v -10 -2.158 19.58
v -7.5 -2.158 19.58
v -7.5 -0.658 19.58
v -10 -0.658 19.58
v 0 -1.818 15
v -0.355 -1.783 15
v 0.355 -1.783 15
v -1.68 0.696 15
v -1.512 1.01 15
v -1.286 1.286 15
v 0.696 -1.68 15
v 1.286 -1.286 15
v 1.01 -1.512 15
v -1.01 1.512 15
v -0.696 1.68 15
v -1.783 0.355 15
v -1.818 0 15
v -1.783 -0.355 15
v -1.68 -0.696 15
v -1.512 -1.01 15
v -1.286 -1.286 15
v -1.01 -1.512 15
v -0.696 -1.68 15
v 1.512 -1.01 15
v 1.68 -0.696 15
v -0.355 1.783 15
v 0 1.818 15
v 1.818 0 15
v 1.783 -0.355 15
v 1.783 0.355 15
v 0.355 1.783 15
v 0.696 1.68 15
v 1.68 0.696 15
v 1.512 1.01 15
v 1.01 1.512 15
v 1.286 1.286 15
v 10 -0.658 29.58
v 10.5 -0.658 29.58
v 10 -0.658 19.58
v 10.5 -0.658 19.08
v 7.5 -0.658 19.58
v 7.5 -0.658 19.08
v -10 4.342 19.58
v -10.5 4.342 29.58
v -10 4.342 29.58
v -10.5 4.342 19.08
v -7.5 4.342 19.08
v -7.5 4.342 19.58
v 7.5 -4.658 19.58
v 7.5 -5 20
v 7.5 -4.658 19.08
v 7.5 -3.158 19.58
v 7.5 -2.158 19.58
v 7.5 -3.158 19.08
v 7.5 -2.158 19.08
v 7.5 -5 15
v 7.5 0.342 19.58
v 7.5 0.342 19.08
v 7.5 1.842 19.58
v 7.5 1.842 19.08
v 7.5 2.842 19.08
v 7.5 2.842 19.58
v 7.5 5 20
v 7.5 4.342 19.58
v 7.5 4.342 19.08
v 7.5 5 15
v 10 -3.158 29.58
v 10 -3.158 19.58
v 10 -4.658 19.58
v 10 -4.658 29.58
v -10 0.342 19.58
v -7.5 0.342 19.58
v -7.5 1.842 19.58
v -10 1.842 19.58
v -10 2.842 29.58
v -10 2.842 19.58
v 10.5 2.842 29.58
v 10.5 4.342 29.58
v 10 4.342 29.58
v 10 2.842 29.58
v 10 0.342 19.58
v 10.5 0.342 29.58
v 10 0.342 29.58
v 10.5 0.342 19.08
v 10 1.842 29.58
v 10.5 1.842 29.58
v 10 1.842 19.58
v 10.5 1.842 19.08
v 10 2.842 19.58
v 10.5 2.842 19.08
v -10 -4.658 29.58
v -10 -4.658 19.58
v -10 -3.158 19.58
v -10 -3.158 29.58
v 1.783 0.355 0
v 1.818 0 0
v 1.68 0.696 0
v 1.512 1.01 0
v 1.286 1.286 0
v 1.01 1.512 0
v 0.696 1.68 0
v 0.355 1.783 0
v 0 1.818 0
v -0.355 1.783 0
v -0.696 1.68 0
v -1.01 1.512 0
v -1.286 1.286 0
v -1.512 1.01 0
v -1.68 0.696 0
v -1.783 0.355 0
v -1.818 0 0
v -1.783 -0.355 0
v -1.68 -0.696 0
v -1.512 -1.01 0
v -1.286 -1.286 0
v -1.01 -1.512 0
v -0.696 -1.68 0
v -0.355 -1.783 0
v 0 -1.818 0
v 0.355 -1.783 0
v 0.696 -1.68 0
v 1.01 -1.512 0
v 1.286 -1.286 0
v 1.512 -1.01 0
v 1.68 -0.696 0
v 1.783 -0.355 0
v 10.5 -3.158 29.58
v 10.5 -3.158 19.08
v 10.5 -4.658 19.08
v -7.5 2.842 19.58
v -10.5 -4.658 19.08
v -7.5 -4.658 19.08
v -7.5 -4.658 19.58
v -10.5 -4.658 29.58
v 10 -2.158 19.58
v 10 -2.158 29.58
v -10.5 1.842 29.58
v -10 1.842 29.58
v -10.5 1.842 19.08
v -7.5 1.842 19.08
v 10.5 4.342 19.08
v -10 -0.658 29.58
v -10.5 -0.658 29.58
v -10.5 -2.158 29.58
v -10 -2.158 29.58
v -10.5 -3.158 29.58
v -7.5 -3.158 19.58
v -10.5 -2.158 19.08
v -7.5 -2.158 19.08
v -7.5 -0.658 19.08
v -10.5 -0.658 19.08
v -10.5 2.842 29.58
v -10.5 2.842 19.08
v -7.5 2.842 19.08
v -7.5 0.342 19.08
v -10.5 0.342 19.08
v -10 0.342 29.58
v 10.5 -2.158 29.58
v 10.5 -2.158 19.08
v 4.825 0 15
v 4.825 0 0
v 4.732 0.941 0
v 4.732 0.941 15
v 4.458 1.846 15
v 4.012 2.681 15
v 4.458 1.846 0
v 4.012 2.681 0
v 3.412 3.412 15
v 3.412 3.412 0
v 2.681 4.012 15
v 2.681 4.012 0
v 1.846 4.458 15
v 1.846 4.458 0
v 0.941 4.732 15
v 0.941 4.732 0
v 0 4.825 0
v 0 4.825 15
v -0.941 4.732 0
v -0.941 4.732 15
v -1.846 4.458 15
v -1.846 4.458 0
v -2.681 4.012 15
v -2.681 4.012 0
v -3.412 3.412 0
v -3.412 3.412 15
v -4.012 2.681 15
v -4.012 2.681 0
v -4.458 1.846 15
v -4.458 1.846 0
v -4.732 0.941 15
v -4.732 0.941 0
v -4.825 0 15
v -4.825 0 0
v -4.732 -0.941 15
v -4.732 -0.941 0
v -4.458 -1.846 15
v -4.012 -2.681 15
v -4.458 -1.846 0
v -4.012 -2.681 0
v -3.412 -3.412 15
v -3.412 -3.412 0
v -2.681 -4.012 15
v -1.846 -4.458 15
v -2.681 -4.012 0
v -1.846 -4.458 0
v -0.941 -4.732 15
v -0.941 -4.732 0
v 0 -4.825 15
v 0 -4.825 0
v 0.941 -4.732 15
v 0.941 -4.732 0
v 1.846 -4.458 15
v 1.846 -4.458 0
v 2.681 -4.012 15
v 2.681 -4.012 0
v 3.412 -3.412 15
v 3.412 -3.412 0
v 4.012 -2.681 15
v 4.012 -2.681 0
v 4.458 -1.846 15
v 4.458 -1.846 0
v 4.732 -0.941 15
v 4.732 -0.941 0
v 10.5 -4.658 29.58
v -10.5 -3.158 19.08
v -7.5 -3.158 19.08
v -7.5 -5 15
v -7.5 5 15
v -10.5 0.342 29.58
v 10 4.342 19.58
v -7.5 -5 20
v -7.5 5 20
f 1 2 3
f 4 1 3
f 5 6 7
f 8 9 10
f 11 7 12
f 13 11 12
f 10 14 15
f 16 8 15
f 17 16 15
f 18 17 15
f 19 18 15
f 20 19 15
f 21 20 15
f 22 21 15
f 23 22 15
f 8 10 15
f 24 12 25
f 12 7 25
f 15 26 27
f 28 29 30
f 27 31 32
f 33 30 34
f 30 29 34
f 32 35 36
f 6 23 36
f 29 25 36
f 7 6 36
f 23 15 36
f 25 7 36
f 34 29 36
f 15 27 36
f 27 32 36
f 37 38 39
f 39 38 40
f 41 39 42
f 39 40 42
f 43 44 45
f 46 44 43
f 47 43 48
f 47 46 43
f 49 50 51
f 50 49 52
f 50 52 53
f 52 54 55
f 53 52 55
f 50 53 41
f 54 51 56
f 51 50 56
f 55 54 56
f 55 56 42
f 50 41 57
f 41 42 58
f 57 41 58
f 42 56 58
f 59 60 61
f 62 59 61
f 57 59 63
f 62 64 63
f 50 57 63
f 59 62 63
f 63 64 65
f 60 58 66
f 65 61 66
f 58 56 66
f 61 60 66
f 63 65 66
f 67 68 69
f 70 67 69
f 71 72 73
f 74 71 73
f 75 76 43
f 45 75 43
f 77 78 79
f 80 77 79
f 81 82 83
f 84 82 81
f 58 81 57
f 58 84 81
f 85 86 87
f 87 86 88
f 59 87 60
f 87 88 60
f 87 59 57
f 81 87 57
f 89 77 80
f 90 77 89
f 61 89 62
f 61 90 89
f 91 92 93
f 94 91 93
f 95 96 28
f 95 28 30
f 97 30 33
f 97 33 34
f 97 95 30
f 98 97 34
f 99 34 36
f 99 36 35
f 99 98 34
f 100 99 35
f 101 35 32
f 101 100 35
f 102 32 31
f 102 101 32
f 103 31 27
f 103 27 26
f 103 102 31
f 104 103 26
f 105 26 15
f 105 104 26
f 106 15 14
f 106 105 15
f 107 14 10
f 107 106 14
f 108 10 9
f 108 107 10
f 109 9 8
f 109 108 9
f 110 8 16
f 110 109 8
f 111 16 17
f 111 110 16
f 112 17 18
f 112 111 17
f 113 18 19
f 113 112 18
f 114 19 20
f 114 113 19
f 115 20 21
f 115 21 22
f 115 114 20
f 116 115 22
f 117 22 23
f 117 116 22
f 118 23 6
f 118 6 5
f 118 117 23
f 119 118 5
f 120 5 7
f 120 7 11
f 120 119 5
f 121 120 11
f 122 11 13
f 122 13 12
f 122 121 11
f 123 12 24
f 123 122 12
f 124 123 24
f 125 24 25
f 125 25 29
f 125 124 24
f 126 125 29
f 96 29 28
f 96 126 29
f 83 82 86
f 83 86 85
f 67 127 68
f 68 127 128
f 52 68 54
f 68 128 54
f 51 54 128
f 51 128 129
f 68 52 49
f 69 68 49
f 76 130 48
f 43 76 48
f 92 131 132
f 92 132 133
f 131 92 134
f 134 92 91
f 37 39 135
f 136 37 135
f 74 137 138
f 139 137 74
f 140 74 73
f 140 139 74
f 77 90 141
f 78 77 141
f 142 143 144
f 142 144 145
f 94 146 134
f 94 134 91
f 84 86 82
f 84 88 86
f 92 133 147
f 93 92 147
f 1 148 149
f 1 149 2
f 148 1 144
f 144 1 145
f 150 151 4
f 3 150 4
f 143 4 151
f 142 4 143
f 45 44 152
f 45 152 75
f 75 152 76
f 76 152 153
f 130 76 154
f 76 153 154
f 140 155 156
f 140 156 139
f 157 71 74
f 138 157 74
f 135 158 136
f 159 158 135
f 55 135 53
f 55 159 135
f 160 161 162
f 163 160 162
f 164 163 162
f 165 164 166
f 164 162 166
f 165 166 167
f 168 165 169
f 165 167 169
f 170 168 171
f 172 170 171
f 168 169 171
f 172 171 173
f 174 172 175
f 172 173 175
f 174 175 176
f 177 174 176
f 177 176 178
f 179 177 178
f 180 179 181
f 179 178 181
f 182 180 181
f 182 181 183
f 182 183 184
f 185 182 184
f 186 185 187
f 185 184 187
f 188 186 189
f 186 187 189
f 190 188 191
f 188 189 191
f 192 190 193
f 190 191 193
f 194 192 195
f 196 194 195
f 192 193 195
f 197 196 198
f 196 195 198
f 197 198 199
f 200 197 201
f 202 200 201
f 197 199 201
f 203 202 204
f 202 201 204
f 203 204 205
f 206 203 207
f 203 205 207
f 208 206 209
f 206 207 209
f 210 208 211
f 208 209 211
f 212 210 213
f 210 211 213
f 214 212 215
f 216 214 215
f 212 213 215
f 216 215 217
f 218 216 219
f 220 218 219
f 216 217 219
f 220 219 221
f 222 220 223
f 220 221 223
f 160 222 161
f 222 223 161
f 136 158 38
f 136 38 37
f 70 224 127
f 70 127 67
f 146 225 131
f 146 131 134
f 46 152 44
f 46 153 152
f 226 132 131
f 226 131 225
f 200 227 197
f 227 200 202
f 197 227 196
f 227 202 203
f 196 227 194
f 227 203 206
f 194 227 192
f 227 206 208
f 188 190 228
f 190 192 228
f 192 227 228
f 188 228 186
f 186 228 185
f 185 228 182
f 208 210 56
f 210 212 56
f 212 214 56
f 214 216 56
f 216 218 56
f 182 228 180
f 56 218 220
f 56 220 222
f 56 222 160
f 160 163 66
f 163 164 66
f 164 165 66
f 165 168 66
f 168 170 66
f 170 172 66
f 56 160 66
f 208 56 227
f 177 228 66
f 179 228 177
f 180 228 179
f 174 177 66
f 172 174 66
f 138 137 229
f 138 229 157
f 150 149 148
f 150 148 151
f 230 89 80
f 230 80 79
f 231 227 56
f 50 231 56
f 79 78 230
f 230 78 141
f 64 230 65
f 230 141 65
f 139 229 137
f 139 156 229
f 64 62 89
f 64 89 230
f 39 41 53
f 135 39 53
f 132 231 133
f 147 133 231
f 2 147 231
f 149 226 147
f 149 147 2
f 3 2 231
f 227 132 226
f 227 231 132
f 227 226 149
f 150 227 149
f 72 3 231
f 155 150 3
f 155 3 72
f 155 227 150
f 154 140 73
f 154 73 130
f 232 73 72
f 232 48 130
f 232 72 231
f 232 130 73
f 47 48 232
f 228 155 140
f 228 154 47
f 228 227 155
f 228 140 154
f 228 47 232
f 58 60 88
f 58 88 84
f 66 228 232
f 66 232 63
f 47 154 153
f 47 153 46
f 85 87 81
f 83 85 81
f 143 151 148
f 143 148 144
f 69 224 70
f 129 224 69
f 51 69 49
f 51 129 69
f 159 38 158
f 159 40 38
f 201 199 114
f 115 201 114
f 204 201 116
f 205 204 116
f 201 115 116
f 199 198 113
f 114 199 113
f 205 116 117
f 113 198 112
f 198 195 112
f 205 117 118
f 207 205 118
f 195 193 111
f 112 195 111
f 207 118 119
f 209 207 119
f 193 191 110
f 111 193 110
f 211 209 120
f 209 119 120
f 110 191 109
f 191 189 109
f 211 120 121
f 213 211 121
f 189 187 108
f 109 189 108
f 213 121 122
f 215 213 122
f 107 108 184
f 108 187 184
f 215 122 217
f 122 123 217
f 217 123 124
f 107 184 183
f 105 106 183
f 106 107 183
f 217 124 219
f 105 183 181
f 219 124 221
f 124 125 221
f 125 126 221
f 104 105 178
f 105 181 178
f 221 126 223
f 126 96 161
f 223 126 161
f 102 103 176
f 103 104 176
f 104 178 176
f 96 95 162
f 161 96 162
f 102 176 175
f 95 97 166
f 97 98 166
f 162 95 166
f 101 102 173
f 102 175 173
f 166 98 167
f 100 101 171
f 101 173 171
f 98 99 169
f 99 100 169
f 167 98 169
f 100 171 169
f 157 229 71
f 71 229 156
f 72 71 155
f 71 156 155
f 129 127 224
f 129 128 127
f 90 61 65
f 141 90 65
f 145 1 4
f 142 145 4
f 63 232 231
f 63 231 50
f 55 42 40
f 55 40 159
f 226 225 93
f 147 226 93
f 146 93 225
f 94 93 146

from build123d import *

# Parameters (mm, degrees)
SKETCH1_R               = 4.825
SKETCH1_R_2             = 1.818202682
BOSS_EXTRUDE1_DEPTH     = 15
SKETCH2_W               = 15
SKETCH2_H               = 10
BOSS_EXTRUDE2_DEPTH     = 5
SKETCH3_W               = 0.5
SKETCH3_H               = 1.5
BOSS_EXTRUDE3_DEPTH     = 3
SKETCH4_W               = 0.5
SKETCH4_H               = 1.5
BOSS_EXTRUDE4_DEPTH     = 10
LPATTERN2_COUNT         = 4
LPATTERN2_PITCH         = 2.5
MIRROR1_COPY_1_SKETCH_W = 0.5
MIRROR1_COPY_1_SKETCH_H = 1.5
MIRROR1_COPY_1_DEPTH    = 3
MIRROR1_COPY_2_SKETCH_W = 0.5
MIRROR1_COPY_2_SKETCH_H = 1.5
MIRROR1_COPY_2_DEPTH    = 3
MIRROR1_COPY_3_SKETCH_W = 0.5
MIRROR1_COPY_3_SKETCH_H = 1.5
MIRROR1_COPY_3_DEPTH    = 3
MIRROR1_COPY_4_SKETCH_W = 0.5
MIRROR1_COPY_4_SKETCH_H = 1.5
MIRROR1_COPY_4_DEPTH    = 10
MIRROR1_COPY_5_SKETCH_W = 0.5
MIRROR1_COPY_5_SKETCH_H = 1.5
MIRROR1_COPY_5_DEPTH    = 10
MIRROR1_COPY_6_SKETCH_W = 0.5
MIRROR1_COPY_6_SKETCH_H = 1.5
MIRROR1_COPY_6_DEPTH    = 10


with BuildPart() as part:
    # Sketch1 → Boss-Extrude1 (new body)
    with BuildSketch(Plane.XY):
        Circle(SKETCH1_R)
        Circle(SKETCH1_R_2, mode=Mode.SUBTRACT)
    extrude(amount=BOSS_EXTRUDE1_DEPTH)

    # Sketch2 → Boss-Extrude2 (add)
    with BuildSketch(Plane.XY.offset(15)):
        Rectangle(SKETCH2_W, SKETCH2_H)
    extrude(amount=BOSS_EXTRUDE2_DEPTH)

    # Sketch3 → Boss-Extrude3 (add)
    with BuildSketch(Plane.ZY.offset(7.5)):
        with Locations((19.330067801, 3.591756208)):
            Rectangle(SKETCH3_W, SKETCH3_H)
    boss_extrude3 = extrude(amount=BOSS_EXTRUDE3_DEPTH)

    # Sketch4 → Boss-Extrude4 (add)
    with BuildSketch(Plane.XY.offset(19.580067801)):
        with Locations((-10.25, 3.591756208)):
            Rectangle(SKETCH4_W, SKETCH4_H)
    boss_extrude4 = extrude(amount=BOSS_EXTRUDE4_DEPTH)

    # LPattern2: Boss-Extrude3, Boss-Extrude4 ×4
    with Locations(*[(0, -i * LPATTERN2_PITCH, 0) for i in range(1, LPATTERN2_COUNT)]):
        add(boss_extrude3)
        add(boss_extrude4)

    # Mirror1: Boss-Extrude3, Boss-Extrude4 across plane
    add(boss_extrude3.mirror(Plane(origin=(0, 0, 0), x_dir=(0, 0, 1), z_dir=(1, 0, 0))))
    add(boss_extrude4.mirror(Plane(origin=(0, 0, 0), x_dir=(0, 0, 1), z_dir=(1, 0, 0))))

    # Mirror1 copy 1 sketch → Mirror1 copy 1 (add)
    with BuildSketch(Plane(origin=(7.5, -2.5, 0), x_dir=(0, 0, 1), z_dir=(1, 0, 0))):
        with Locations((19.330067801, -3.591756208)):
            Rectangle(MIRROR1_COPY_1_SKETCH_W, MIRROR1_COPY_1_SKETCH_H)
    extrude(amount=MIRROR1_COPY_1_DEPTH)

    # Mirror1 copy 2 sketch → Mirror1 copy 2 (add)
    with BuildSketch(Plane(origin=(7.5, -5, 0), x_dir=(0, 0, 1), z_dir=(1, 0, 0))):
        with Locations((19.330067801, -3.591756208)):
            Rectangle(MIRROR1_COPY_2_SKETCH_W, MIRROR1_COPY_2_SKETCH_H)
    extrude(amount=MIRROR1_COPY_2_DEPTH)

    # Mirror1 copy 3 sketch → Mirror1 copy 3 (add)
    with BuildSketch(Plane(origin=(7.5, -7.5, 0), x_dir=(0, 0, 1), z_dir=(1, 0, 0))):
        with Locations((19.330067801, -3.591756208)):
            Rectangle(MIRROR1_COPY_3_SKETCH_W, MIRROR1_COPY_3_SKETCH_H)
    extrude(amount=MIRROR1_COPY_3_DEPTH)

    # Mirror1 copy 4 sketch → Mirror1 copy 4 (add)
    with BuildSketch(Plane(origin=(0, -2.5, 19.580067801), x_dir=(-1, 0, 0), z_dir=(0, 0, 1))):
        with Locations((-10.25, -3.591756208)):
            Rectangle(MIRROR1_COPY_4_SKETCH_W, MIRROR1_COPY_4_SKETCH_H)
    extrude(amount=MIRROR1_COPY_4_DEPTH)

    # Mirror1 copy 5 sketch → Mirror1 copy 5 (add)
    with BuildSketch(Plane(origin=(0, -5, 19.580067801), x_dir=(-1, 0, 0), z_dir=(0, 0, 1))):
        with Locations((-10.25, -3.591756208)):
            Rectangle(MIRROR1_COPY_5_SKETCH_W, MIRROR1_COPY_5_SKETCH_H)
    extrude(amount=MIRROR1_COPY_5_DEPTH)

    # Mirror1 copy 6 sketch → Mirror1 copy 6 (add)
    with BuildSketch(Plane(origin=(0, -7.5, 19.580067801), x_dir=(-1, 0, 0), z_dir=(0, 0, 1))):
        with Locations((-10.25, -3.591756208)):
            Rectangle(MIRROR1_COPY_6_SKETCH_W, MIRROR1_COPY_6_SKETCH_H)
    extrude(amount=MIRROR1_COPY_6_DEPTH)


solid = part.part
